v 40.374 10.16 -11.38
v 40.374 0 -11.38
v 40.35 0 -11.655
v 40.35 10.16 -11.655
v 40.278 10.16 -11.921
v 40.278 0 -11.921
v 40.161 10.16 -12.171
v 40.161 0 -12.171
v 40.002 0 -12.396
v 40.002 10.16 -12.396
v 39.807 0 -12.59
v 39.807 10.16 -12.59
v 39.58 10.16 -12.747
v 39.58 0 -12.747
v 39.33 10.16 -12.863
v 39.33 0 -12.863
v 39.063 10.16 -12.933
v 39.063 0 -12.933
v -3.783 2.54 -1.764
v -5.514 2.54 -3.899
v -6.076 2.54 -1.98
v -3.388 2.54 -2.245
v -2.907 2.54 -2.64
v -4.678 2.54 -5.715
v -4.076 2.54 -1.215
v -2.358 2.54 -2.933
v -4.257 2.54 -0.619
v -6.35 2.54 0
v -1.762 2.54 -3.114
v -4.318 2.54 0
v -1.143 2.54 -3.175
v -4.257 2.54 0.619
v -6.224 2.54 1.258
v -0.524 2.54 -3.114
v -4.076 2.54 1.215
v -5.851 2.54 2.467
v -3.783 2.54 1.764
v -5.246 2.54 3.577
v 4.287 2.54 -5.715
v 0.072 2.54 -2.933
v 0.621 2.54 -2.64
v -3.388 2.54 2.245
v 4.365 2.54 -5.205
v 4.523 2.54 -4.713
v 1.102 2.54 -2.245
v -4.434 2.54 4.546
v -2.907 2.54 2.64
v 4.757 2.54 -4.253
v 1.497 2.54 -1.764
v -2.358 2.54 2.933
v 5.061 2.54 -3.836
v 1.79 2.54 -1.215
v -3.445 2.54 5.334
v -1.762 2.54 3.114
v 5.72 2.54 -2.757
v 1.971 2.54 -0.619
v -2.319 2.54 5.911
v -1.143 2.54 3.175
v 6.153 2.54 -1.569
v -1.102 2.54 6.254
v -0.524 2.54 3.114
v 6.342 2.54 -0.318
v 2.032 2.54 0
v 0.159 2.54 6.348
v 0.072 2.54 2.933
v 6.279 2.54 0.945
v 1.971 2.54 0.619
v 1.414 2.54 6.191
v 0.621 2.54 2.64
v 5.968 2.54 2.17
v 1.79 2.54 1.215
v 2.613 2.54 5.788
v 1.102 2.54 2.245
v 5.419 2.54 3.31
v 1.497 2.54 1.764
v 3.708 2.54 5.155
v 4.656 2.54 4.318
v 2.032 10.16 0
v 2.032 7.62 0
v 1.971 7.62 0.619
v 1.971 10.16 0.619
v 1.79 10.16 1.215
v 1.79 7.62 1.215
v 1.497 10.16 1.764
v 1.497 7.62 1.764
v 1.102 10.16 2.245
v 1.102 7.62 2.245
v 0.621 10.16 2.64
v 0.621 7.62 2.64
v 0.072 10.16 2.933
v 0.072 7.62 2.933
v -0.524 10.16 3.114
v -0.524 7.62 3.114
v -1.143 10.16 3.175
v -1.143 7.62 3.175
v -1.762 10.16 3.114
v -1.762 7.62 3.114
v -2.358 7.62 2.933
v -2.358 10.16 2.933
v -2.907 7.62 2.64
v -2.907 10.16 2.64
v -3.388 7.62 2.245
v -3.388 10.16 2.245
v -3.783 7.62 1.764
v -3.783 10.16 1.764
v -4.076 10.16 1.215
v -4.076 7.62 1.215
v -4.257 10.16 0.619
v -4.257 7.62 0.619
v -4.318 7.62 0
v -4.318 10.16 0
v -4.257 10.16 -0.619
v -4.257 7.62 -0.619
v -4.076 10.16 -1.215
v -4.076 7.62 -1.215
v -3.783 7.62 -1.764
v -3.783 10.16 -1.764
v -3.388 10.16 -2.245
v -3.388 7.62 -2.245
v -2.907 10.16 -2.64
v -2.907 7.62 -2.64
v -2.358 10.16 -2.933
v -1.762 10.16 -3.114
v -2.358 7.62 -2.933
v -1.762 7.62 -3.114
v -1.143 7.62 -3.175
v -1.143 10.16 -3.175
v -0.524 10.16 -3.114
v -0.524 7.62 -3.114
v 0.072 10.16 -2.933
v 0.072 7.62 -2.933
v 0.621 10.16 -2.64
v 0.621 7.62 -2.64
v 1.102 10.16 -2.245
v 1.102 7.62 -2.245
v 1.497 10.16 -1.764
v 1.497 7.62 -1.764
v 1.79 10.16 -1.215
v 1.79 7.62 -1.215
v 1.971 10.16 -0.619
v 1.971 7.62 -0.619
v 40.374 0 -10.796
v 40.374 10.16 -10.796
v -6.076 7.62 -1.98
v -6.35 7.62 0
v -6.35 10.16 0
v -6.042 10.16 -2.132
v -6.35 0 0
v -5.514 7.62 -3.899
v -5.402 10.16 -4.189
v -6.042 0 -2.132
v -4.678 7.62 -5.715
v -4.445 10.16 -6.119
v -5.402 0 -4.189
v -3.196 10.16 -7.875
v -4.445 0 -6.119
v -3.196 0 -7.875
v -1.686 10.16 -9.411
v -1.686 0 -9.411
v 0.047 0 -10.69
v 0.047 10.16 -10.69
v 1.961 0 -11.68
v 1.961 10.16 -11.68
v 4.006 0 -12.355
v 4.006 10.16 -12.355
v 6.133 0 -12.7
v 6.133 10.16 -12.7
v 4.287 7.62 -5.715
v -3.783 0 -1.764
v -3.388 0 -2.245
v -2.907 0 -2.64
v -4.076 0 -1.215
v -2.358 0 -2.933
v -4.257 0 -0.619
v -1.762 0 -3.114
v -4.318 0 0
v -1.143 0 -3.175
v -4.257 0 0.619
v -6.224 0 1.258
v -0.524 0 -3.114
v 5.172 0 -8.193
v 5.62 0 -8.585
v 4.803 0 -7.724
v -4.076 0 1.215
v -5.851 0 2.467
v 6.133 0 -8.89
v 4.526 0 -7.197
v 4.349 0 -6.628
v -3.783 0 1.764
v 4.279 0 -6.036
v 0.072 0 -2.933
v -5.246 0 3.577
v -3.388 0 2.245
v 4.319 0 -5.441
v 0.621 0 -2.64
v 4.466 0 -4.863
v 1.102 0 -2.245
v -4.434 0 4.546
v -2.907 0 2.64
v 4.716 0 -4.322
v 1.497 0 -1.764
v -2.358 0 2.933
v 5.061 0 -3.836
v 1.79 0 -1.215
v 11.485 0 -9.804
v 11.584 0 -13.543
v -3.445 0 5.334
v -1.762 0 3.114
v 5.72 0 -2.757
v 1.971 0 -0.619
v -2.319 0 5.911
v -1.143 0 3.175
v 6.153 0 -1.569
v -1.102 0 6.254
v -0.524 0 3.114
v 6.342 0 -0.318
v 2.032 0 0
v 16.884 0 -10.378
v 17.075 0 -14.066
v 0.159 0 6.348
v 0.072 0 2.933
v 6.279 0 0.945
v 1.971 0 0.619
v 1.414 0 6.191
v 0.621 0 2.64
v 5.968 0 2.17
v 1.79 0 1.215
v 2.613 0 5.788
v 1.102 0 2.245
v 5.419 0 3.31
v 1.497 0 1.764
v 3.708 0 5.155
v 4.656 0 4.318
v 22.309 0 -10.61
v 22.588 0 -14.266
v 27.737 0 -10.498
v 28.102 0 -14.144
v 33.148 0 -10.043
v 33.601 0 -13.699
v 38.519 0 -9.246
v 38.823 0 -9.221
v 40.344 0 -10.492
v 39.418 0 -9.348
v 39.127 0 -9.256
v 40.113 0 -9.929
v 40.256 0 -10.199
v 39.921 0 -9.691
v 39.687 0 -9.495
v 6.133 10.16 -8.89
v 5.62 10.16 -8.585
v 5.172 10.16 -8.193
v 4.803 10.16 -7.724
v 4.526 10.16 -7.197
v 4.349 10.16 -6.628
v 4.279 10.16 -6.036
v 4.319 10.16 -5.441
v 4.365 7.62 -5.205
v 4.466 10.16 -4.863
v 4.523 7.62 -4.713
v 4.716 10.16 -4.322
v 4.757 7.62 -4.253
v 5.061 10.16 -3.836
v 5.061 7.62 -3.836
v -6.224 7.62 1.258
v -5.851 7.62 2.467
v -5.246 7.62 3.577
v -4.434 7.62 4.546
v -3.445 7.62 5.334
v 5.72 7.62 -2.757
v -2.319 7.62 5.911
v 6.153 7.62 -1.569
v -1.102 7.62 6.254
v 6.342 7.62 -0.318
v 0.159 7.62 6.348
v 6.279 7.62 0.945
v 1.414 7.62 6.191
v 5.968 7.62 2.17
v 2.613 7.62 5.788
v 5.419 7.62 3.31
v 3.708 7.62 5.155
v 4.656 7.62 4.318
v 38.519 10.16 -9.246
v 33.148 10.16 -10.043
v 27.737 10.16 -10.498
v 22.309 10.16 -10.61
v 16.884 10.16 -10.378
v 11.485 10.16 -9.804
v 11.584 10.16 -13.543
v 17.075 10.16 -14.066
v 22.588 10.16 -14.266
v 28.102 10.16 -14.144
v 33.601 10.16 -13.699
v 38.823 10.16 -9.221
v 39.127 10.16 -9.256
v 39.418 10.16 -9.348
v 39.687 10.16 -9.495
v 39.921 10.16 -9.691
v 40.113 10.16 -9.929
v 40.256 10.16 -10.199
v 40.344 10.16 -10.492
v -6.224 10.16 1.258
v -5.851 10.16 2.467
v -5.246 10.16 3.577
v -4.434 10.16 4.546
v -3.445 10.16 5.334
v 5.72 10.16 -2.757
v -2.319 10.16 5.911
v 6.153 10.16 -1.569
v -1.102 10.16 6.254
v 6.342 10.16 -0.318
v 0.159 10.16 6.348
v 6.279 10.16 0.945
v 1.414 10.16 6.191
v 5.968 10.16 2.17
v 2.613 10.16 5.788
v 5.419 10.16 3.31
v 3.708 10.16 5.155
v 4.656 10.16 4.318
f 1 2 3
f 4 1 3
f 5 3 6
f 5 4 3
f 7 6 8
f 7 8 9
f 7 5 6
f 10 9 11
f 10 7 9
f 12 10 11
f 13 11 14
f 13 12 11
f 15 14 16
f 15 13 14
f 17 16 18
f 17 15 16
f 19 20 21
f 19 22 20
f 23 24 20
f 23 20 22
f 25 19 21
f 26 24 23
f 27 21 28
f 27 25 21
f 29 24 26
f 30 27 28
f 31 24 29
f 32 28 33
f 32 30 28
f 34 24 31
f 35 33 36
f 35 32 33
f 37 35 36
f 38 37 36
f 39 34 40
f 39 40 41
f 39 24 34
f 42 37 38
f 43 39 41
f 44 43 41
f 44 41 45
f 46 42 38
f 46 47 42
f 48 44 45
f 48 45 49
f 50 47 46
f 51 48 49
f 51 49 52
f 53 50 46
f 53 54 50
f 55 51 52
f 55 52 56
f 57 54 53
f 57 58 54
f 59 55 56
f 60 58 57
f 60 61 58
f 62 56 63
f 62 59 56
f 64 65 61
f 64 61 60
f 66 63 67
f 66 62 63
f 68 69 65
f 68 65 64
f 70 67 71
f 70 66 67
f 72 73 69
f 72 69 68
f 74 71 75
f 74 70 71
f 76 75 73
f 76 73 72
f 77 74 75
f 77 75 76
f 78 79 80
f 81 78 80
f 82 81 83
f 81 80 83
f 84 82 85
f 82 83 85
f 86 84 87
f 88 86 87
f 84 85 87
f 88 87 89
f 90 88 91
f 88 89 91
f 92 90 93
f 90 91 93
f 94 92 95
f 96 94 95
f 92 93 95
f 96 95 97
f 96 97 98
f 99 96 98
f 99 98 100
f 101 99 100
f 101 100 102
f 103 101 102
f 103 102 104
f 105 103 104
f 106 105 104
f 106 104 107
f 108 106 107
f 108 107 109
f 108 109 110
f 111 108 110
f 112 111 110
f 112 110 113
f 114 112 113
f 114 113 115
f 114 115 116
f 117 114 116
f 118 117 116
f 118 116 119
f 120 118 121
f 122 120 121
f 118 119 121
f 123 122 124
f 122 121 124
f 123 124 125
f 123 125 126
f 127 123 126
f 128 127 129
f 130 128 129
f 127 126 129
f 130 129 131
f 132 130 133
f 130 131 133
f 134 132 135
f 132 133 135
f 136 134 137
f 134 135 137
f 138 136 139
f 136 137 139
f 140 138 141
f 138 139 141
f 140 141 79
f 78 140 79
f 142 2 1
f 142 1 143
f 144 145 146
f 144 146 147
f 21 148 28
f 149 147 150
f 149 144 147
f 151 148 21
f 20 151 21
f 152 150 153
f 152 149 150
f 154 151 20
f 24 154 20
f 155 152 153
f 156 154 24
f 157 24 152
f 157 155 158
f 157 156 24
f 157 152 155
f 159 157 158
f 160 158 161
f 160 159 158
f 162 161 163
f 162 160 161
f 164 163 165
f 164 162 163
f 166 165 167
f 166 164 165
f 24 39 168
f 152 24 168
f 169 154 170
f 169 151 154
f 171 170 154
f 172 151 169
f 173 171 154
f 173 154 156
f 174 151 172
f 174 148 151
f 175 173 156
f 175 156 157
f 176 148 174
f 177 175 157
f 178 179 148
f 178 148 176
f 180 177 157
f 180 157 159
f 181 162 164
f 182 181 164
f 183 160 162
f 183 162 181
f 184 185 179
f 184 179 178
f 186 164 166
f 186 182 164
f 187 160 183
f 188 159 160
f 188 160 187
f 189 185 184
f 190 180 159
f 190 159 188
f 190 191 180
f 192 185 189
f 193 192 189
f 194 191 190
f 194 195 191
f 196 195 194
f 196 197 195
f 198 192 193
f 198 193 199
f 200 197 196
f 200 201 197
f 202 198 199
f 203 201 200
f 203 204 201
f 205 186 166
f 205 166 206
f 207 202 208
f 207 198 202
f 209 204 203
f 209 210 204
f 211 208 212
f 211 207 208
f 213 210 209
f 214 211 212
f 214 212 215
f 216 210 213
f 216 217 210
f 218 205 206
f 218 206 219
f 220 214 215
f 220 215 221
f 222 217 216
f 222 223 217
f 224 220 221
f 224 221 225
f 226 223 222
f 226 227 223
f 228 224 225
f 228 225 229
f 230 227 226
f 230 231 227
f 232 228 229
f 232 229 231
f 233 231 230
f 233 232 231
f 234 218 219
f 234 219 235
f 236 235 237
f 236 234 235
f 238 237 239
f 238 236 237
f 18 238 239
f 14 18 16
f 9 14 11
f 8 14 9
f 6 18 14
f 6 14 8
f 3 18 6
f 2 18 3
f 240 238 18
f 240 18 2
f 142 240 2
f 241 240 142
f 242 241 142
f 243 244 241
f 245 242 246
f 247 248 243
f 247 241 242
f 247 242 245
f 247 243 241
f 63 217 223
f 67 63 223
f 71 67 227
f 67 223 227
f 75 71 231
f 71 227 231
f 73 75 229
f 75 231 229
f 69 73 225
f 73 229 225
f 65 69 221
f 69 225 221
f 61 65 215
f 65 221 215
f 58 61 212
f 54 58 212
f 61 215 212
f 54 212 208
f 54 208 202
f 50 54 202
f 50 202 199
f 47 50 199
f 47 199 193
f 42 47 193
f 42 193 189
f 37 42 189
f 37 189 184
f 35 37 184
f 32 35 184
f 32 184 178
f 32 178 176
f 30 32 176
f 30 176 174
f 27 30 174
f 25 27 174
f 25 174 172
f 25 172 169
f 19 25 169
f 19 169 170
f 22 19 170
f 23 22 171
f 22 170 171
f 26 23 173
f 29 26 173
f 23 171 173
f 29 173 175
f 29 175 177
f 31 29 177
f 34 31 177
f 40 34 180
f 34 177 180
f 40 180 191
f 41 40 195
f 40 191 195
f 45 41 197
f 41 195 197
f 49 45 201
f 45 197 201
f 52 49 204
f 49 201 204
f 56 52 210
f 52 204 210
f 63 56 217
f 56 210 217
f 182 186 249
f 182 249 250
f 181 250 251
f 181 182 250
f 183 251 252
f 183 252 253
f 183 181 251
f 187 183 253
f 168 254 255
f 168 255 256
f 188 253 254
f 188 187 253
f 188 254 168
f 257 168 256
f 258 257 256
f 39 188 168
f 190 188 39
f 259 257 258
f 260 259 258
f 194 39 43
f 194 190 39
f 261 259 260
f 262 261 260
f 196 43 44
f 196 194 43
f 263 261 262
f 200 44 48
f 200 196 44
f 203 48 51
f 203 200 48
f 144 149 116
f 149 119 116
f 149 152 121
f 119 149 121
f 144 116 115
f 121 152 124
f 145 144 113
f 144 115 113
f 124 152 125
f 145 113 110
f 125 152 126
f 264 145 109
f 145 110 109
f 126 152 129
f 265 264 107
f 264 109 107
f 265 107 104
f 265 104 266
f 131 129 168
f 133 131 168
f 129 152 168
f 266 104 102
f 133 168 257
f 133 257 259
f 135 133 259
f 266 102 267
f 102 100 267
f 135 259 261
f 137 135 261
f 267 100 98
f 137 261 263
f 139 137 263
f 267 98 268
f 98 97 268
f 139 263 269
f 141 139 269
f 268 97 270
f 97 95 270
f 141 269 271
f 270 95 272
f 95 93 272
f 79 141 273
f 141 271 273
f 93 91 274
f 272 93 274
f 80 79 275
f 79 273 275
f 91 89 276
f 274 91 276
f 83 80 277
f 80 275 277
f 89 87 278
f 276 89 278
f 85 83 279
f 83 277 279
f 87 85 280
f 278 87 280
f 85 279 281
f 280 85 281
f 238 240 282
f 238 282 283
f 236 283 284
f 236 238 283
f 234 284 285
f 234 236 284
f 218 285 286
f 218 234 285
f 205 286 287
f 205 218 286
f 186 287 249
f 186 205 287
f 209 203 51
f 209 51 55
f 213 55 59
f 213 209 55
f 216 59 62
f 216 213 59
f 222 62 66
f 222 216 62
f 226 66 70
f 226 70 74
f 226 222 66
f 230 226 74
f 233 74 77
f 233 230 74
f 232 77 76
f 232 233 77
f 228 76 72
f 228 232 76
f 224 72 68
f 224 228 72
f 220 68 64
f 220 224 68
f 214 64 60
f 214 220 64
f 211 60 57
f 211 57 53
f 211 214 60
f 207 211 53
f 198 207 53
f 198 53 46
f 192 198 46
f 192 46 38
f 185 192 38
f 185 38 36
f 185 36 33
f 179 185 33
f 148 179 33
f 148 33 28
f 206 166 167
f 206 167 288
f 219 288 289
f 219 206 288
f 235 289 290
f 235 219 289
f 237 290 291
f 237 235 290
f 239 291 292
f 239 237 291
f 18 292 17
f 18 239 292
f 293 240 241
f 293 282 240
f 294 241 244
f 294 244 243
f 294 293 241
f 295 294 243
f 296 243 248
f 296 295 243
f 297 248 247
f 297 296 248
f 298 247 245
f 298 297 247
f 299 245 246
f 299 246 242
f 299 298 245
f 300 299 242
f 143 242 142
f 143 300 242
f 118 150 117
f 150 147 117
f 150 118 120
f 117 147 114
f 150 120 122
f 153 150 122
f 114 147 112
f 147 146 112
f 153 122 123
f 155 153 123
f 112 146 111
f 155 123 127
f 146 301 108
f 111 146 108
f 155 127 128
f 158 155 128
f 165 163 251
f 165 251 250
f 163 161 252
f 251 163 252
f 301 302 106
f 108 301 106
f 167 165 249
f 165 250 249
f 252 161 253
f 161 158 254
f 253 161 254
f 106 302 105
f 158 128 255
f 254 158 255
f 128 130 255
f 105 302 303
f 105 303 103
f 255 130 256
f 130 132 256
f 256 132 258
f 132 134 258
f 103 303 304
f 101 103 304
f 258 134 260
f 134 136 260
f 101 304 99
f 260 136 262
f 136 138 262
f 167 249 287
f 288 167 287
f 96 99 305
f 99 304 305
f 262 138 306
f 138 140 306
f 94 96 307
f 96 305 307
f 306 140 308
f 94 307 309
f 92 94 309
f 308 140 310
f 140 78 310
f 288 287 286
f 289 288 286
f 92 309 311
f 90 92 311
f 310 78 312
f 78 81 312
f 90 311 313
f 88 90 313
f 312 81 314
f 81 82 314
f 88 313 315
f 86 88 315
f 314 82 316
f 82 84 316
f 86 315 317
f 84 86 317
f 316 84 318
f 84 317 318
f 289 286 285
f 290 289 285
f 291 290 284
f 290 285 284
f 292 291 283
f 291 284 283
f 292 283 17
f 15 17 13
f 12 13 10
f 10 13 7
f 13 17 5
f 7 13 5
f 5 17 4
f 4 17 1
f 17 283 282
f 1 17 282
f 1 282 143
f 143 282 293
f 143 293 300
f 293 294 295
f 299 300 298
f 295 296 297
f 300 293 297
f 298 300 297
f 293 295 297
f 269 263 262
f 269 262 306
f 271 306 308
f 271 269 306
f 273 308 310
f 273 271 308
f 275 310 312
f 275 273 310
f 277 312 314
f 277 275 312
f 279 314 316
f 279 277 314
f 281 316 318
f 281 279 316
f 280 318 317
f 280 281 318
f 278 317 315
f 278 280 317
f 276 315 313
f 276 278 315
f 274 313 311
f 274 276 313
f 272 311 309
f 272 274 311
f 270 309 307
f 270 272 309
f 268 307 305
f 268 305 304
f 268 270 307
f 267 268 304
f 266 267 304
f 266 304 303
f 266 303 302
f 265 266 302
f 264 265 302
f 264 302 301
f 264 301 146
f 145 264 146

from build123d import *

# Parameters (mm, degrees)
F0_R     = 3.175
F1_DEPTH = 10.16
F2_W     = 5.08
F2_H     = 13.335
F3_DEPTH = 12.7
F4_R     = 1.5748


with BuildPart() as f1:
    # F0 (on Front) → F1 (new body)
    with BuildSketch(Plane.XZ):
        with BuildLine():
            ThreePointArc((6.132791, -8.89), (4.348923, -6.627547), (5.060618, -3.835707))
            ThreePointArc((5.060618, -3.835707), (2.023311, 6.019029), (-6.35, 0))
            ThreePointArc((-6.35, 0), (-2.471626, -8.672607), (6.132791, -12.7))
            ThreePointArc((6.132791, -12.7), (23.253233, -14.268605), (40.373676, -12.7))
            Line((40.373676, -12.7), (40.373676, -8.89))
            ThreePointArc((40.373676, -8.89), (23.253233, -10.614816), (6.132791, -8.89))
        make_face()
        with Locations((-1.143, 0)):
            Circle(F0_R, mode=Mode.SUBTRACT)
    extrude(amount=-F1_DEPTH)

    # F2 (on Right) → F3 (cut, symmetric)
    with BuildSketch(Plane.YZ):
        with Locations((5.08, 0.9525)):
            Rectangle(F2_W, F2_H)
    extrude(amount=F3_DEPTH, both=True, mode=Mode.SUBTRACT)

    # F4
    f4_edges = [f1.edges().sort_by_distance(p)[0] for p in [
        (40.373676, 5.08, -8.89),
        (40.373676, 5.08, -12.7),
    ]]
    fillet(f4_edges, radius=F4_R)


solid = f1.part
